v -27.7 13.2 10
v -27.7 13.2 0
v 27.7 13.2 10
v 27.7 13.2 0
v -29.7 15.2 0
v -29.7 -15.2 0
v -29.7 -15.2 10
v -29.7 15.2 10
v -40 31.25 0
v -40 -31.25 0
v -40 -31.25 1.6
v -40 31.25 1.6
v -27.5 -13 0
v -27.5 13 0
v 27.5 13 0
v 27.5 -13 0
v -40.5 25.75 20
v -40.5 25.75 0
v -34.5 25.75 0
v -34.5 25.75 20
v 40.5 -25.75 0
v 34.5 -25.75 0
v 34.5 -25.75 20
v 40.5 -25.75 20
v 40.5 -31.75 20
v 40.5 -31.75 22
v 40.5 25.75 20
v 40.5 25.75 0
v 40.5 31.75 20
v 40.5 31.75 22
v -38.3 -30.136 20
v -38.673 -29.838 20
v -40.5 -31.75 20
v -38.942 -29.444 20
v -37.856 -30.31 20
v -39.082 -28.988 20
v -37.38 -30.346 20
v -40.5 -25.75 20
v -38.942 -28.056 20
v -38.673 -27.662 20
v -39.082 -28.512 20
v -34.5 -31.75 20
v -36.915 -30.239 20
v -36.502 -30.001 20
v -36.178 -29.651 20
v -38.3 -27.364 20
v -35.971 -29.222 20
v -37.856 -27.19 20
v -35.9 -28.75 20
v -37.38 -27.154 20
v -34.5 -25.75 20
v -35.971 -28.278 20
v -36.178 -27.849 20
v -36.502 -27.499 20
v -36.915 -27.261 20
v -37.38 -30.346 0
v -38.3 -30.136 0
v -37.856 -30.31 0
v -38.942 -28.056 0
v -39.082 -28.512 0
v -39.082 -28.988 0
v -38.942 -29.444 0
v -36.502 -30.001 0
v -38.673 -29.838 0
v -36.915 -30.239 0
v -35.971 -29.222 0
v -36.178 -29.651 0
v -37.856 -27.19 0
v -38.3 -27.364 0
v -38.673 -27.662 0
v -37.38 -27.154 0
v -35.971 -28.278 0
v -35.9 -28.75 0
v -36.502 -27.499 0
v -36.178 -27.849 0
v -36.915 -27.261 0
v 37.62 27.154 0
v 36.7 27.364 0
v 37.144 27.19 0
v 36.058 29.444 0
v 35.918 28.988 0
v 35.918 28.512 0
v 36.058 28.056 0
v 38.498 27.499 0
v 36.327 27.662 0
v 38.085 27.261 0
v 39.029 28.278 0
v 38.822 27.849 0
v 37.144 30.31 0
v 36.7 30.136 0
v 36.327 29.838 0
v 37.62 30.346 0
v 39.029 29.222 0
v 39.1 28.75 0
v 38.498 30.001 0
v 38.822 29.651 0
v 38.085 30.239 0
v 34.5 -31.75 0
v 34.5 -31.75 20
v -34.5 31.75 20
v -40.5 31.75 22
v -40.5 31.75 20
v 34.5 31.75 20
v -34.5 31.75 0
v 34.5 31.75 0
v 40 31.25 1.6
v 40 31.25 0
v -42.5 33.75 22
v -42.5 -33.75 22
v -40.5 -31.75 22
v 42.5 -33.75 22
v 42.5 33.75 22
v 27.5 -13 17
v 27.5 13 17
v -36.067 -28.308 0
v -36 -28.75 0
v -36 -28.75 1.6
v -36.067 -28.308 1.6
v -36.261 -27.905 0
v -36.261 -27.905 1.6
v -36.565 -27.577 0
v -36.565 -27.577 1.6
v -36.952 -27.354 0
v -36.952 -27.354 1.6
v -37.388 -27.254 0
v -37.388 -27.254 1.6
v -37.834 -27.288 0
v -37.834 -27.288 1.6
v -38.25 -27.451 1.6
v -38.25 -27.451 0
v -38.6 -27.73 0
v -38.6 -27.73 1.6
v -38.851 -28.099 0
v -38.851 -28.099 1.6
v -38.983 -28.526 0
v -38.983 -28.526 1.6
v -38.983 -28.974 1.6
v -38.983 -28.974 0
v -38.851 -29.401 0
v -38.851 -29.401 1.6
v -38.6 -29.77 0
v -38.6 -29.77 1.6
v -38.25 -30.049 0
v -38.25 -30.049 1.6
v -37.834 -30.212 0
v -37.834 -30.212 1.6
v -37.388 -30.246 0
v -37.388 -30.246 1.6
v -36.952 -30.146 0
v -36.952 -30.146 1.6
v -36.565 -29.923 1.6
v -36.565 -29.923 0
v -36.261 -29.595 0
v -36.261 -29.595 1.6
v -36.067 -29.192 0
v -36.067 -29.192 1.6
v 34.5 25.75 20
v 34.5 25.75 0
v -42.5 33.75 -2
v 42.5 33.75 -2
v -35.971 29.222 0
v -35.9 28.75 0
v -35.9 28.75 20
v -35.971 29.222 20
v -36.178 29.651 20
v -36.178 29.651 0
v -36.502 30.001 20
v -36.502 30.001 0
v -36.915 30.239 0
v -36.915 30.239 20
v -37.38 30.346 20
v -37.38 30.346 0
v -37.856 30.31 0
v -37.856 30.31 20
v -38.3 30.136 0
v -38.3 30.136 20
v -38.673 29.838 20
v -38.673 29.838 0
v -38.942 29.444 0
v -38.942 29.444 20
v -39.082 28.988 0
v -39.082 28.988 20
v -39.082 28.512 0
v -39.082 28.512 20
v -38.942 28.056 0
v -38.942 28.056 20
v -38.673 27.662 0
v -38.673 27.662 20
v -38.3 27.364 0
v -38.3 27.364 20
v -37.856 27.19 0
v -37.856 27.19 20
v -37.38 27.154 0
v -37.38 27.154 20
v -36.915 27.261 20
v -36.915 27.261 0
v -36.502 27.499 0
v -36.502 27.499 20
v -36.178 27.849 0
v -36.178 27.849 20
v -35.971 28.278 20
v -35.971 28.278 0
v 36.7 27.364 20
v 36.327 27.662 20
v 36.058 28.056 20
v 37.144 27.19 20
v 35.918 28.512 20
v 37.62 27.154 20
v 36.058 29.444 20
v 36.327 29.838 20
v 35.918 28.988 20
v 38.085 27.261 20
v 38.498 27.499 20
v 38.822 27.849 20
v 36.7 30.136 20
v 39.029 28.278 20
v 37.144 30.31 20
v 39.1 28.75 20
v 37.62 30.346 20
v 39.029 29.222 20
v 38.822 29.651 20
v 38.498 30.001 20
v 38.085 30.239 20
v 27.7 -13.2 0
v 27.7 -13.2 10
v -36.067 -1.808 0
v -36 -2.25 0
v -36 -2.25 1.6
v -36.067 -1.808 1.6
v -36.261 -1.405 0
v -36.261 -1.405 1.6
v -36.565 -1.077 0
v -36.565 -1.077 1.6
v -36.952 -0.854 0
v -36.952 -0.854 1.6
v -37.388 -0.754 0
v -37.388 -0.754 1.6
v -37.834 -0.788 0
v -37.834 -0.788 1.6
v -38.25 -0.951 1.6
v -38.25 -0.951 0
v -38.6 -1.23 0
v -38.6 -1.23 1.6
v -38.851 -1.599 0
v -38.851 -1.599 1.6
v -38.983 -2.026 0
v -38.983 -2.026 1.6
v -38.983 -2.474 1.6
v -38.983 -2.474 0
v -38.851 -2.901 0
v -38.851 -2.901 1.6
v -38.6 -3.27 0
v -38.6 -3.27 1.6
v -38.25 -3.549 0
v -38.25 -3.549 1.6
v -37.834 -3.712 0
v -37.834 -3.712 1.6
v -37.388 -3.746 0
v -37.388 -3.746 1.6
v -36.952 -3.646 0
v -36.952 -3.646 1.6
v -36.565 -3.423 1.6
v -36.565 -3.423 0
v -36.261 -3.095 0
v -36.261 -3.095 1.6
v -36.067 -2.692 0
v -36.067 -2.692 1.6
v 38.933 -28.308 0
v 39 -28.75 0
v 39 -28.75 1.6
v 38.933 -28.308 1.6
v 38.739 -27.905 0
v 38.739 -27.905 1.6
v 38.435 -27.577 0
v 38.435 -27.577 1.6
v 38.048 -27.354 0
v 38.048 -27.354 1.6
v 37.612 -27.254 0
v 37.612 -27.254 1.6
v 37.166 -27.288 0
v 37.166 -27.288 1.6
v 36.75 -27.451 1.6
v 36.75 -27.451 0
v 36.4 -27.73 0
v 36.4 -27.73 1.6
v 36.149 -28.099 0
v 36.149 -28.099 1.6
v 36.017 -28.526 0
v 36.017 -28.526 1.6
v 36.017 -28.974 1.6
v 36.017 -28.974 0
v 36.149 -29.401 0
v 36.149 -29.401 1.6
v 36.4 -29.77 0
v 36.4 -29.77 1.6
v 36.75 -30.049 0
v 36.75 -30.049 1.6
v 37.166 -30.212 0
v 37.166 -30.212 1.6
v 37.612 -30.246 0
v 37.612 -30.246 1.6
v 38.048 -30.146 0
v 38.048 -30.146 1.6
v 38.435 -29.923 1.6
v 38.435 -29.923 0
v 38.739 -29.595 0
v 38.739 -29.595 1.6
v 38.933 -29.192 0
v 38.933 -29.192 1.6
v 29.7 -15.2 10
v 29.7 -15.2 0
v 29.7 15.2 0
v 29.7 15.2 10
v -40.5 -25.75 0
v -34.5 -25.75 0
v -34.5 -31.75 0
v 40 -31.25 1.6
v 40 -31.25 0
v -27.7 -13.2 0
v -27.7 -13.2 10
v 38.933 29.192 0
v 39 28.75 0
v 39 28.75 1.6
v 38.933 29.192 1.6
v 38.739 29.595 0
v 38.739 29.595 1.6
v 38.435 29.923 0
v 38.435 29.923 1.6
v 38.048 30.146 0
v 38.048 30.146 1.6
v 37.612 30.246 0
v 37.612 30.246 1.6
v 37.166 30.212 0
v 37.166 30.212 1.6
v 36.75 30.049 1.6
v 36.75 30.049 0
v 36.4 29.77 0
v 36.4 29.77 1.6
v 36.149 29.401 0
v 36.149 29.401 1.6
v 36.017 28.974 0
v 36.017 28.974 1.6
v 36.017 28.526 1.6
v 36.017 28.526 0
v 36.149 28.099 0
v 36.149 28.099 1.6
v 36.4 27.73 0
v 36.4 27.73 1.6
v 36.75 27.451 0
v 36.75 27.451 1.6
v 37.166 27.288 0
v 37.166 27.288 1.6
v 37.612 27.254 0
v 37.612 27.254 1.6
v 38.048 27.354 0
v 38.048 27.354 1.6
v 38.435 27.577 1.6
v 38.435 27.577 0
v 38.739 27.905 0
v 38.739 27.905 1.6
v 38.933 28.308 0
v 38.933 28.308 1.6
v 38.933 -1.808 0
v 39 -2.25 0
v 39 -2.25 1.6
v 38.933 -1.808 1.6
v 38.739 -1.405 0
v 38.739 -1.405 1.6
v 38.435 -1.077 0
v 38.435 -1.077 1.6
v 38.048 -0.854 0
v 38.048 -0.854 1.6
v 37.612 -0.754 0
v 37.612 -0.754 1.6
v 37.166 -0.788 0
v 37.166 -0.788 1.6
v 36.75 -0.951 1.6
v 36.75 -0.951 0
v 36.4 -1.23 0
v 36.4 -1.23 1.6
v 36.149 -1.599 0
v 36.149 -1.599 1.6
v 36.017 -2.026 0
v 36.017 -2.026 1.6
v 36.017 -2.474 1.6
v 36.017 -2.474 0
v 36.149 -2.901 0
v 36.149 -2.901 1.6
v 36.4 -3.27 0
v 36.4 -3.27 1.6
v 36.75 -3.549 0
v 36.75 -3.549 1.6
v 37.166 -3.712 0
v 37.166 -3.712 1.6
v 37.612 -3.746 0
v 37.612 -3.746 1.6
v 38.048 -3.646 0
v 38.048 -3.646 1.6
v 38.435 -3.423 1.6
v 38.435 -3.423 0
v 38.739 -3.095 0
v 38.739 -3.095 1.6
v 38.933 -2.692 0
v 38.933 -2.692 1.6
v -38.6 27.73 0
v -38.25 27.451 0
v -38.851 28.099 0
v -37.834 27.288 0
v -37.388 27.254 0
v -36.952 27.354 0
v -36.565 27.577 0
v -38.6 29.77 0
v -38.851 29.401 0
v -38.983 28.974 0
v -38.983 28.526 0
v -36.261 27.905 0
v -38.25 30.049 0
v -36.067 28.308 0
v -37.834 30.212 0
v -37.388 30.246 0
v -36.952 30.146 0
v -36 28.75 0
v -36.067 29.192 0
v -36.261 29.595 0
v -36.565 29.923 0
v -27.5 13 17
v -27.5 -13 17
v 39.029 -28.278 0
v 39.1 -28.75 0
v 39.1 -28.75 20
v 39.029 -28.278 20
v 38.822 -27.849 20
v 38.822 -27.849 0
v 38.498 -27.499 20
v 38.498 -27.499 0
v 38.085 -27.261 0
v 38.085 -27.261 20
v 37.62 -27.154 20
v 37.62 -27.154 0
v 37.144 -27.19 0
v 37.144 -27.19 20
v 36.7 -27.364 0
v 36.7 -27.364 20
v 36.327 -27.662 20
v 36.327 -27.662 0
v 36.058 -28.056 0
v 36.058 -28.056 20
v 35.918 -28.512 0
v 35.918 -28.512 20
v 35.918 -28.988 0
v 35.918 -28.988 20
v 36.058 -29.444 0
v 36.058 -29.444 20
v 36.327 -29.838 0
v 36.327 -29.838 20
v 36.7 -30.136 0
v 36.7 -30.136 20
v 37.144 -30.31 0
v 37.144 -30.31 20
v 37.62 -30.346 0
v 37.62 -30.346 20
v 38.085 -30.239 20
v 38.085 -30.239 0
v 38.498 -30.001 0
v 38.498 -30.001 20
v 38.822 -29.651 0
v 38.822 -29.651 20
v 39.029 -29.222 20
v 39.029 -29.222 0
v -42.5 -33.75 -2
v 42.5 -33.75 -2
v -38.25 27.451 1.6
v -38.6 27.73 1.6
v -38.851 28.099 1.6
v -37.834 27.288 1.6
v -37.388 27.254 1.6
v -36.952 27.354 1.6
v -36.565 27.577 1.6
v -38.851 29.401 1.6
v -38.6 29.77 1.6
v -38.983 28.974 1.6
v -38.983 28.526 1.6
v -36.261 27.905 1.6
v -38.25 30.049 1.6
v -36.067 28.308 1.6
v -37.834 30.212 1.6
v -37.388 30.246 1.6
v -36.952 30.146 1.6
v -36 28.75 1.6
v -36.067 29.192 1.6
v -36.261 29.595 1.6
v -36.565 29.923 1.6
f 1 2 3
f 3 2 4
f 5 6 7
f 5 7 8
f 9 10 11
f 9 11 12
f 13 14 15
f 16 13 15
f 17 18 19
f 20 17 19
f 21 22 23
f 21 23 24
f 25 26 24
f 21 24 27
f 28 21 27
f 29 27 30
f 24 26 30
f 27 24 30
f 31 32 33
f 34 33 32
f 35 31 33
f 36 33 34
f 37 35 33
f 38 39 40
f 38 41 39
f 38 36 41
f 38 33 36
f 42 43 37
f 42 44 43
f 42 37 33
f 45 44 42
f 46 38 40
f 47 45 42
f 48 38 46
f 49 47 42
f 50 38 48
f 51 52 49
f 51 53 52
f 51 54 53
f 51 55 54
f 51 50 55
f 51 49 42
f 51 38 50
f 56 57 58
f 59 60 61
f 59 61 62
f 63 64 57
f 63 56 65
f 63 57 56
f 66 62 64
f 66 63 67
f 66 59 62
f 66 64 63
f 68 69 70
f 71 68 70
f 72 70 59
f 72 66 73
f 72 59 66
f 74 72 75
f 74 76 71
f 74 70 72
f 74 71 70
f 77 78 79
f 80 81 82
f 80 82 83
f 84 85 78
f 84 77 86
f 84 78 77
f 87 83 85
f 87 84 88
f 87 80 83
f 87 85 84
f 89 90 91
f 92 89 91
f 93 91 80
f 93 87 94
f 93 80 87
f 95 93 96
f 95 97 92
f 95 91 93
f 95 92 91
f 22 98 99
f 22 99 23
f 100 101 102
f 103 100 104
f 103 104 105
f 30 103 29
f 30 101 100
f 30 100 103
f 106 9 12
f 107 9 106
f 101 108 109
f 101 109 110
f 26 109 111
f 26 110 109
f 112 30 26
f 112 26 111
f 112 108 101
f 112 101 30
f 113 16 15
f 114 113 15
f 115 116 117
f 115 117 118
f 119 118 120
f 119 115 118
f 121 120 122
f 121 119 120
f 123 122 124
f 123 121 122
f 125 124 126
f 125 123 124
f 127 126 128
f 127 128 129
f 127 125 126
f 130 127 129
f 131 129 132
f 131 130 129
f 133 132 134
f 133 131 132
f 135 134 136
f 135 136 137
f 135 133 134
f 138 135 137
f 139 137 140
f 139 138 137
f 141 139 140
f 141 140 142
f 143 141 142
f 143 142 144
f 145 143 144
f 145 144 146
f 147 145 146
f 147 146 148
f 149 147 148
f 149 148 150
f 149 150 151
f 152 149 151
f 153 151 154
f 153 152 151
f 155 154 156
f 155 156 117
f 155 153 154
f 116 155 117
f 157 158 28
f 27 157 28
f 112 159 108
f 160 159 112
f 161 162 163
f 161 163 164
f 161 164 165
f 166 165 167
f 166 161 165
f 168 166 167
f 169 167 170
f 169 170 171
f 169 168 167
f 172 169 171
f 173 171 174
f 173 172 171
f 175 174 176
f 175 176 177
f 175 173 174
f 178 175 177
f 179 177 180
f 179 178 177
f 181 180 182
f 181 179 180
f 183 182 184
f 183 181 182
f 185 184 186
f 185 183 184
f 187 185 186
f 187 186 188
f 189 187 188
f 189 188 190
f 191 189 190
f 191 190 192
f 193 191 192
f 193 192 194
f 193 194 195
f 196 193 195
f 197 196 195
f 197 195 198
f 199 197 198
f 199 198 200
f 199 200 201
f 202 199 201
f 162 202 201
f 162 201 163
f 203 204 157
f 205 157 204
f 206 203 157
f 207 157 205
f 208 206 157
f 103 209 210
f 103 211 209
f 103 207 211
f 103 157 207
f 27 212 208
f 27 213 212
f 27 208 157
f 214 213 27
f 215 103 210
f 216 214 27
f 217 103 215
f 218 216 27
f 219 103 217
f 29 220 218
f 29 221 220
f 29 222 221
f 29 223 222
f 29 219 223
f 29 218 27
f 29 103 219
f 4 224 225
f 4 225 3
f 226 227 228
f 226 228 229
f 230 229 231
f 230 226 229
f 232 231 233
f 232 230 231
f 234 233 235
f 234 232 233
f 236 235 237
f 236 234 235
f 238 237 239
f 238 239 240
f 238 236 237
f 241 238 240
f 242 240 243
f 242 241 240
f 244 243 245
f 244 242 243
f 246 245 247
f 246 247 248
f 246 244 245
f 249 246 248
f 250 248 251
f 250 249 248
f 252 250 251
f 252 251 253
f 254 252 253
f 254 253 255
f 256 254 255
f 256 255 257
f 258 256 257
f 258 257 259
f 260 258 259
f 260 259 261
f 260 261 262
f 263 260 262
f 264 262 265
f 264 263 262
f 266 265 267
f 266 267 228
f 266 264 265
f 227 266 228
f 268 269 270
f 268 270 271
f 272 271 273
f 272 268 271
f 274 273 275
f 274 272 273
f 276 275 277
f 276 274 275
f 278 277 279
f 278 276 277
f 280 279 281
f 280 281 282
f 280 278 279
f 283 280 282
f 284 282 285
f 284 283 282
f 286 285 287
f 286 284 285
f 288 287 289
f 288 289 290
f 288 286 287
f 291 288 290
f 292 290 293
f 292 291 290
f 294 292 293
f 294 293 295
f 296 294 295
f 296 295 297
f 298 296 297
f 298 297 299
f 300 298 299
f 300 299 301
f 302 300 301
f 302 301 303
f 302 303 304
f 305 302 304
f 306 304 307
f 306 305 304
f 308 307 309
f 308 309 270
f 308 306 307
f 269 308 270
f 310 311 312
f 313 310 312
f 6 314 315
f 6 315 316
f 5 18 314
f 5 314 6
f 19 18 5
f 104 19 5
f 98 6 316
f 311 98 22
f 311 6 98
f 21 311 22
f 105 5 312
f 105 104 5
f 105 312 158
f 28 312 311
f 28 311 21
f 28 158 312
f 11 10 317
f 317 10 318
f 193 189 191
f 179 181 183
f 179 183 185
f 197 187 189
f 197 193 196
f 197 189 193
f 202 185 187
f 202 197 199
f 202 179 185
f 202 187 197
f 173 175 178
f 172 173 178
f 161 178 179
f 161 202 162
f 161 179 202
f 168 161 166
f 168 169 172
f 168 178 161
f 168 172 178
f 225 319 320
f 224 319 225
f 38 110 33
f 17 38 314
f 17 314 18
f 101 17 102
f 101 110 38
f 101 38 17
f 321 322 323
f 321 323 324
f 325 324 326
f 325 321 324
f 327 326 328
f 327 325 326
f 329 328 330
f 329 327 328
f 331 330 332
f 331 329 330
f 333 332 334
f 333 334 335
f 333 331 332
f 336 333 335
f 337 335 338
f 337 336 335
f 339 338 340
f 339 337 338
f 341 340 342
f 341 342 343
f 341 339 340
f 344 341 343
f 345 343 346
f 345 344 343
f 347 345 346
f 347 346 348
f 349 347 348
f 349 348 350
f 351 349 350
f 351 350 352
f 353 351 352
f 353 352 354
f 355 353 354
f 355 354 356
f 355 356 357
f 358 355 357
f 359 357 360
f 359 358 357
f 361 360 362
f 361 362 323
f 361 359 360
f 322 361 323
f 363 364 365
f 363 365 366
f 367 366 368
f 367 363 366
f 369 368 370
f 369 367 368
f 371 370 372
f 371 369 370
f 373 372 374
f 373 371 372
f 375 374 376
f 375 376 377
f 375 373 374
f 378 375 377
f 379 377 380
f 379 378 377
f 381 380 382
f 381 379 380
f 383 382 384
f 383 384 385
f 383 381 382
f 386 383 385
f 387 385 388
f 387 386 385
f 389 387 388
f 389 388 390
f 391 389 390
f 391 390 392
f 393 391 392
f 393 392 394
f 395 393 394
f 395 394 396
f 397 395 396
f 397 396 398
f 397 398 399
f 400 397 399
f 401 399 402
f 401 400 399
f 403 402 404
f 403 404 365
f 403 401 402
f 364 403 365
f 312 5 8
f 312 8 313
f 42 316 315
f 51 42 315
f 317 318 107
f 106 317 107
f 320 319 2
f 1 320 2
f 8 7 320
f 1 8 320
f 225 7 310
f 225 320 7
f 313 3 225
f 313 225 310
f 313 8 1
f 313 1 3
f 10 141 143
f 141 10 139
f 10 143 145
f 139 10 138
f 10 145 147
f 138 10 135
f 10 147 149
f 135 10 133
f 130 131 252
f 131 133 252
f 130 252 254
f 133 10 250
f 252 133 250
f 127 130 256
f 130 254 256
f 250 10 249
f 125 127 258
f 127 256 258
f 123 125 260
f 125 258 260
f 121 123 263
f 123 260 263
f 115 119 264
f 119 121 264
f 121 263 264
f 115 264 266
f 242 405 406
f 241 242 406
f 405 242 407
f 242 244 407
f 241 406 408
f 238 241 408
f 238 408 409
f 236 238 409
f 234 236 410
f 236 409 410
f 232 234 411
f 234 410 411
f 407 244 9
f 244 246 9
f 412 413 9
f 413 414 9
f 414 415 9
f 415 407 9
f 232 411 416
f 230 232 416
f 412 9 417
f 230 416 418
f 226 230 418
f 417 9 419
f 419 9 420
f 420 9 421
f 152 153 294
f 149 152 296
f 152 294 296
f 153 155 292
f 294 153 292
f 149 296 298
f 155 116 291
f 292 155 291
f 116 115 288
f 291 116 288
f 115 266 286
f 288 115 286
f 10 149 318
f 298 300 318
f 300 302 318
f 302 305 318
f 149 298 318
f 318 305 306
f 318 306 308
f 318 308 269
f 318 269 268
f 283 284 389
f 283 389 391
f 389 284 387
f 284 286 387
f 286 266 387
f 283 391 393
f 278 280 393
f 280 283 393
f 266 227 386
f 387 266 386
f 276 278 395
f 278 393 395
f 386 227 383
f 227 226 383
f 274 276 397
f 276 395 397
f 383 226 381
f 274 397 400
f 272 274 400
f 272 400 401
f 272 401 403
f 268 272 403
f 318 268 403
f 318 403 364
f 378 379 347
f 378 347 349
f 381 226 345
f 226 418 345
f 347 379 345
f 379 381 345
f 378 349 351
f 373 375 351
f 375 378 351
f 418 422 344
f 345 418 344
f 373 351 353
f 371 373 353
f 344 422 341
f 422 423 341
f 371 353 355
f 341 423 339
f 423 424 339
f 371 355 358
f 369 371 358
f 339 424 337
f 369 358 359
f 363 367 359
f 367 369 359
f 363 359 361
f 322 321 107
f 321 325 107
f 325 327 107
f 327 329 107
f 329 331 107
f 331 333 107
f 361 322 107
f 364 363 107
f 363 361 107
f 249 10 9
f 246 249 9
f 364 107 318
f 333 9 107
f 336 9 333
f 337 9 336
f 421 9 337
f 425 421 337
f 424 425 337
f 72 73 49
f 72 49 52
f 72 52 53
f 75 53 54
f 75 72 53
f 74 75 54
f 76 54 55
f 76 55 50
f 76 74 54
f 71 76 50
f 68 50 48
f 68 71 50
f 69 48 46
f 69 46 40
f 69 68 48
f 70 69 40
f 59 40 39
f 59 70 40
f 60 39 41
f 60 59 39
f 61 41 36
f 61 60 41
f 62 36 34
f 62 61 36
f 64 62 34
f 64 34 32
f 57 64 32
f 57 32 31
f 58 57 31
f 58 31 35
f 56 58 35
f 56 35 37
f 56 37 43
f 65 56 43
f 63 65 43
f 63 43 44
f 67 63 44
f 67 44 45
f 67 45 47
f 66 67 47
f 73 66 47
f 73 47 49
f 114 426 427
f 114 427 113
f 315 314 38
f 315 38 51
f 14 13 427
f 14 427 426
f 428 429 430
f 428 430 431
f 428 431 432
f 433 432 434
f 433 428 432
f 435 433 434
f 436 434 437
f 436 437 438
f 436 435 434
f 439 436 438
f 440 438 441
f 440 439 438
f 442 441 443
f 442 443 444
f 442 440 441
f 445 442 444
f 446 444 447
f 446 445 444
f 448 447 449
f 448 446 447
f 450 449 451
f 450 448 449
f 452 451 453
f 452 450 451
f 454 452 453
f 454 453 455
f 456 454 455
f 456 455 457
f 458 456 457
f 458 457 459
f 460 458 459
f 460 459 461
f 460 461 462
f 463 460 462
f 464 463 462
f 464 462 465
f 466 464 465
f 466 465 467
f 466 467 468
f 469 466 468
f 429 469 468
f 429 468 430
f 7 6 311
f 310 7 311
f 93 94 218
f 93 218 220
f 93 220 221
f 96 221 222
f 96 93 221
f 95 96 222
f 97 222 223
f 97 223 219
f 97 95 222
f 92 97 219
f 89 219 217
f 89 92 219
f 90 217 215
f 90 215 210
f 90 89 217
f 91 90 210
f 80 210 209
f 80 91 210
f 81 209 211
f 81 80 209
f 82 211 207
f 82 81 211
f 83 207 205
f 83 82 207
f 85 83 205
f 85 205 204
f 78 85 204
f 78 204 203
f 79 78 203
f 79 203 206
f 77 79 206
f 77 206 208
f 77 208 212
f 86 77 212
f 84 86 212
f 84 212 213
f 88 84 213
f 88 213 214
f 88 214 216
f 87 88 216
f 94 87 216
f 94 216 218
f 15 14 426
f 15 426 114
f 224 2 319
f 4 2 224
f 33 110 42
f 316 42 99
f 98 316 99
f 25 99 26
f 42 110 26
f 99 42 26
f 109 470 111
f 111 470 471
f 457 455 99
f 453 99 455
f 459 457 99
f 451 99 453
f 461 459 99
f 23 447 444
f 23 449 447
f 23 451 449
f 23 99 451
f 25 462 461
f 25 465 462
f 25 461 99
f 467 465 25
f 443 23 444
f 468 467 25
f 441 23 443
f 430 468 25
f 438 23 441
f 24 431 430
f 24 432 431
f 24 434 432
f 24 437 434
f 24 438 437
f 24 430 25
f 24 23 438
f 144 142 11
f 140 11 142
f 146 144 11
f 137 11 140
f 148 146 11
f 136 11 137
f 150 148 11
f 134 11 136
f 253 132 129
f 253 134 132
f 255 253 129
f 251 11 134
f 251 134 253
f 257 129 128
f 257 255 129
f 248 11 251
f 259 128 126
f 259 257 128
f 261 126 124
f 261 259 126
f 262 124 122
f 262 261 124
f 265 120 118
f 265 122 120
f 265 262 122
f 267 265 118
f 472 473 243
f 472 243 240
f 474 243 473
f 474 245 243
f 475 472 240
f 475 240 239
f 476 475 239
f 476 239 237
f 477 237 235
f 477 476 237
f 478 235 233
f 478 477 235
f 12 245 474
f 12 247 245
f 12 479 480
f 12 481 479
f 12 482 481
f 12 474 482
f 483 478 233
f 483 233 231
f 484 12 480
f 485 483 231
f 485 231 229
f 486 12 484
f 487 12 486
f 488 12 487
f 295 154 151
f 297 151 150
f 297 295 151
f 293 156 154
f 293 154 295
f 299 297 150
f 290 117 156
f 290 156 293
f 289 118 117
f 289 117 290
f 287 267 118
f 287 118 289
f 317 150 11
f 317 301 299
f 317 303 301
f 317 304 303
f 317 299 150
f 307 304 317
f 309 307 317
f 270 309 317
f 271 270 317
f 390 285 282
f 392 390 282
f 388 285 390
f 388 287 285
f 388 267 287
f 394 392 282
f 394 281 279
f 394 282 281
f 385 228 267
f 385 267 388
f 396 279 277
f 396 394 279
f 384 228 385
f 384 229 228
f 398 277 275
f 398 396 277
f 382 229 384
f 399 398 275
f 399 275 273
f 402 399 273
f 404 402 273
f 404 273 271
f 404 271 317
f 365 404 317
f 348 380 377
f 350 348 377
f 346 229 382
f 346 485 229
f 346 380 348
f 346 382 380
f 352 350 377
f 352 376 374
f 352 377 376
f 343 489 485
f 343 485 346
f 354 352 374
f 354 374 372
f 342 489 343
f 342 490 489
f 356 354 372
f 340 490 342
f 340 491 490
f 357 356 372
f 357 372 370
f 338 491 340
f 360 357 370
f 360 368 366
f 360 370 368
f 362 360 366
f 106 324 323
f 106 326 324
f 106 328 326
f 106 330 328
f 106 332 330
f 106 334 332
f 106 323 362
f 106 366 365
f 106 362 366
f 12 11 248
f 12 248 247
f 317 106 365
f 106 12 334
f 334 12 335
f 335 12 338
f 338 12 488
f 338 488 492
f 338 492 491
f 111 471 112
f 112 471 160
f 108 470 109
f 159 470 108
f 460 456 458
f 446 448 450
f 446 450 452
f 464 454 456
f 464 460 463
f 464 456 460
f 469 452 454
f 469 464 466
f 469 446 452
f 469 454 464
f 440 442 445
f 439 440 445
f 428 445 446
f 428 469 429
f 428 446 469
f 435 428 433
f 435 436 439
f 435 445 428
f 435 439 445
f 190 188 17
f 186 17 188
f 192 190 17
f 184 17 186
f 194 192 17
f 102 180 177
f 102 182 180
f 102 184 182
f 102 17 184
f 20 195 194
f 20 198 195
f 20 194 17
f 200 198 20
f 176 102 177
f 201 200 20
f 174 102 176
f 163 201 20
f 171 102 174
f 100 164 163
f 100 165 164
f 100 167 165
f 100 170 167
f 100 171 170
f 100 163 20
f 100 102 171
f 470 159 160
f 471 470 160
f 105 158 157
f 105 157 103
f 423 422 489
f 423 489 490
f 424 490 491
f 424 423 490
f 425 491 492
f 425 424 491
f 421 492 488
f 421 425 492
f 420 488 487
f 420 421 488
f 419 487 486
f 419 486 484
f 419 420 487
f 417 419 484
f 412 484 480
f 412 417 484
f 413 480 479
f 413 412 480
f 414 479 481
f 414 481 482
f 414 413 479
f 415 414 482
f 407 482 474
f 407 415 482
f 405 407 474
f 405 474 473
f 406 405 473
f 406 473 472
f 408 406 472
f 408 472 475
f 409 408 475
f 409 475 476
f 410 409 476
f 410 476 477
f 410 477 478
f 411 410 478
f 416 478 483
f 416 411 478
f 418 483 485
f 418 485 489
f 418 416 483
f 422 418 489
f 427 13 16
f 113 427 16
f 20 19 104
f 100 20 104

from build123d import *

# Parameters (mm, degrees)
F1_W      = 80
F1_H      = 62.5
F1_R      = 1.5
F2_DEPTH  = 1.6
F3_W      = 85
F3_H      = 67.5
F3_W_2    = 6
F3_H_2    = 6
F3_R      = 1.6
F4_DEPTH  = 2
F5_DEPTH  = 22
F6_W      = 6
F6_H      = 6
F6_R      = 1.6
F7_DEPTH  = 2
F8_W      = 55
F8_H      = 26
F9_DEPTH  = 17
F10_W     = 59.4
F10_H     = 30.4
F10_W_2   = 55.4
F10_H_2   = 26.4
F11_DEPTH = 10


with BuildPart() as f2:
    # F1 (on Top) → F2 (new body)
    with BuildSketch(Plane.XY):
        Rectangle(F1_W, F1_H)
        with Locations((-37.5, -28.75)):
            Circle(F1_R, mode=Mode.SUBTRACT)
        with Locations((-37.5, -2.25)):
            Circle(F1_R, mode=Mode.SUBTRACT)
        with Locations((37.5, -28.75)):
            Circle(F1_R, mode=Mode.SUBTRACT)
        with Locations((37.5, -2.25)):
            Circle(F1_R, mode=Mode.SUBTRACT)
        with Locations((-37.5, 28.75)):
            Circle(F1_R, mode=Mode.SUBTRACT)
        with Locations((37.5, 28.75)):
            Circle(F1_R, mode=Mode.SUBTRACT)
    extrude(amount=F2_DEPTH)


with BuildPart() as f4:
    # F3 (on Top) → F4 (new body)
    with BuildSketch(Plane.XY):
        Rectangle(F3_W, F3_H)
        Polygon((34.5, 31.75), (40.5, 31.75), (40.5, 25.75), (40.5, -25.75), (40.5, -31.75), (34.5, -31.75), (-34.5, -31.75), (-40.5, -31.75), (-40.5, -25.75), (-40.5, 25.75), (-40.5, 31.75), (-34.5, 31.75), align=None, mode=Mode.SUBTRACT)
        with Locations((-37.5, 28.75)):
            Rectangle(F3_W_2, F3_H_2)
        with Locations((-37.5, 28.75)):
            Circle(F3_R, mode=Mode.SUBTRACT)
        with Locations((-37.5, 28.75)):
            Circle(F3_R)
        Polygon((34.5, 25.75), (34.5, 31.75), (-34.5, 31.75), (-34.5, 25.75), (-40.5, 25.75), (-40.5, -25.75), (-34.5, -25.75), (-34.5, -31.75), (34.5, -31.75), (34.5, -25.75), (40.5, -25.75), (40.5, 25.75), align=None)
        with Locations((37.5, 28.75)):
            Rectangle(F3_W_2, F3_H_2)
        with Locations((37.5, 28.75)):
            Circle(F3_R, mode=Mode.SUBTRACT)
        with Locations((37.5, 28.75)):
            Circle(F3_R)
        with Locations((37.5, -28.75)):
            Rectangle(F3_W_2, F3_H_2)
        with Locations((37.5, -28.75)):
            Circle(F3_R, mode=Mode.SUBTRACT)
        with Locations((37.5, -28.75)):
            Circle(F3_R)
        with Locations((-37.5, -28.75)):
            Rectangle(F3_W_2, F3_H_2)
        with Locations((-37.5, -28.75)):
            Circle(F3_R, mode=Mode.SUBTRACT)
        with Locations((-37.5, -28.75)):
            Circle(F3_R)
    extrude(amount=-F4_DEPTH)

    # F3 (on Top) → F5 (join)
    with BuildSketch(Plane.XY):
        Rectangle(F3_W, F3_H)
        Polygon((34.5, 31.75), (40.5, 31.75), (40.5, 25.75), (40.5, -25.75), (40.5, -31.75), (34.5, -31.75), (-34.5, -31.75), (-40.5, -31.75), (-40.5, -25.75), (-40.5, 25.75), (-40.5, 31.75), (-34.5, 31.75), align=None, mode=Mode.SUBTRACT)
        with Locations((-37.5, 28.75)):
            Rectangle(F3_W_2, F3_H_2)
        with Locations((-37.5, 28.75)):
            Circle(F3_R, mode=Mode.SUBTRACT)
        with Locations((37.5, 28.75)):
            Rectangle(F3_W_2, F3_H_2)
        with Locations((37.5, 28.75)):
            Circle(F3_R, mode=Mode.SUBTRACT)
        with Locations((37.5, -28.75)):
            Rectangle(F3_W_2, F3_H_2)
        with Locations((37.5, -28.75)):
            Circle(F3_R, mode=Mode.SUBTRACT)
        with Locations((-37.5, -28.75)):
            Rectangle(F3_W_2, F3_H_2)
        with Locations((-37.5, -28.75)):
            Circle(F3_R, mode=Mode.SUBTRACT)
    extrude(amount=F5_DEPTH)

    # F6 (on face) → F7 (cut)
    with BuildSketch(Plane.XY.offset(22)):
        with Locations((-37.5, 28.75)):
            Rectangle(F6_W, F6_H)
        with Locations((-37.5, 28.75)):
            Circle(F6_R, mode=Mode.SUBTRACT)
        with Locations((-37.5, -28.75)):
            Rectangle(F6_W, F6_H)
        with Locations((-37.5, -28.75)):
            Circle(F6_R, mode=Mode.SUBTRACT)
        with Locations((37.5, 28.75)):
            Rectangle(F6_W, F6_H)
        with Locations((37.5, 28.75)):
            Circle(F6_R, mode=Mode.SUBTRACT)
        with Locations((37.5, -28.75)):
            Rectangle(F6_W, F6_H)
        with Locations((37.5, -28.75)):
            Circle(F6_R, mode=Mode.SUBTRACT)
    extrude(amount=-F7_DEPTH, mode=Mode.SUBTRACT)

    # F10 (on face) → F11 (join)
    with BuildSketch(Plane.XY):
        Rectangle(F10_W, F10_H)
        Rectangle(F10_W_2, F10_H_2, mode=Mode.SUBTRACT)
    extrude(amount=F11_DEPTH)


with BuildPart() as f9:
    # F8 (on Top) → F9 (new body)
    with BuildSketch(Plane.XY):
        Rectangle(F8_W, F8_H)
    extrude(amount=F9_DEPTH)


solid = Compound([f2.part, f4.part, f9.part])
